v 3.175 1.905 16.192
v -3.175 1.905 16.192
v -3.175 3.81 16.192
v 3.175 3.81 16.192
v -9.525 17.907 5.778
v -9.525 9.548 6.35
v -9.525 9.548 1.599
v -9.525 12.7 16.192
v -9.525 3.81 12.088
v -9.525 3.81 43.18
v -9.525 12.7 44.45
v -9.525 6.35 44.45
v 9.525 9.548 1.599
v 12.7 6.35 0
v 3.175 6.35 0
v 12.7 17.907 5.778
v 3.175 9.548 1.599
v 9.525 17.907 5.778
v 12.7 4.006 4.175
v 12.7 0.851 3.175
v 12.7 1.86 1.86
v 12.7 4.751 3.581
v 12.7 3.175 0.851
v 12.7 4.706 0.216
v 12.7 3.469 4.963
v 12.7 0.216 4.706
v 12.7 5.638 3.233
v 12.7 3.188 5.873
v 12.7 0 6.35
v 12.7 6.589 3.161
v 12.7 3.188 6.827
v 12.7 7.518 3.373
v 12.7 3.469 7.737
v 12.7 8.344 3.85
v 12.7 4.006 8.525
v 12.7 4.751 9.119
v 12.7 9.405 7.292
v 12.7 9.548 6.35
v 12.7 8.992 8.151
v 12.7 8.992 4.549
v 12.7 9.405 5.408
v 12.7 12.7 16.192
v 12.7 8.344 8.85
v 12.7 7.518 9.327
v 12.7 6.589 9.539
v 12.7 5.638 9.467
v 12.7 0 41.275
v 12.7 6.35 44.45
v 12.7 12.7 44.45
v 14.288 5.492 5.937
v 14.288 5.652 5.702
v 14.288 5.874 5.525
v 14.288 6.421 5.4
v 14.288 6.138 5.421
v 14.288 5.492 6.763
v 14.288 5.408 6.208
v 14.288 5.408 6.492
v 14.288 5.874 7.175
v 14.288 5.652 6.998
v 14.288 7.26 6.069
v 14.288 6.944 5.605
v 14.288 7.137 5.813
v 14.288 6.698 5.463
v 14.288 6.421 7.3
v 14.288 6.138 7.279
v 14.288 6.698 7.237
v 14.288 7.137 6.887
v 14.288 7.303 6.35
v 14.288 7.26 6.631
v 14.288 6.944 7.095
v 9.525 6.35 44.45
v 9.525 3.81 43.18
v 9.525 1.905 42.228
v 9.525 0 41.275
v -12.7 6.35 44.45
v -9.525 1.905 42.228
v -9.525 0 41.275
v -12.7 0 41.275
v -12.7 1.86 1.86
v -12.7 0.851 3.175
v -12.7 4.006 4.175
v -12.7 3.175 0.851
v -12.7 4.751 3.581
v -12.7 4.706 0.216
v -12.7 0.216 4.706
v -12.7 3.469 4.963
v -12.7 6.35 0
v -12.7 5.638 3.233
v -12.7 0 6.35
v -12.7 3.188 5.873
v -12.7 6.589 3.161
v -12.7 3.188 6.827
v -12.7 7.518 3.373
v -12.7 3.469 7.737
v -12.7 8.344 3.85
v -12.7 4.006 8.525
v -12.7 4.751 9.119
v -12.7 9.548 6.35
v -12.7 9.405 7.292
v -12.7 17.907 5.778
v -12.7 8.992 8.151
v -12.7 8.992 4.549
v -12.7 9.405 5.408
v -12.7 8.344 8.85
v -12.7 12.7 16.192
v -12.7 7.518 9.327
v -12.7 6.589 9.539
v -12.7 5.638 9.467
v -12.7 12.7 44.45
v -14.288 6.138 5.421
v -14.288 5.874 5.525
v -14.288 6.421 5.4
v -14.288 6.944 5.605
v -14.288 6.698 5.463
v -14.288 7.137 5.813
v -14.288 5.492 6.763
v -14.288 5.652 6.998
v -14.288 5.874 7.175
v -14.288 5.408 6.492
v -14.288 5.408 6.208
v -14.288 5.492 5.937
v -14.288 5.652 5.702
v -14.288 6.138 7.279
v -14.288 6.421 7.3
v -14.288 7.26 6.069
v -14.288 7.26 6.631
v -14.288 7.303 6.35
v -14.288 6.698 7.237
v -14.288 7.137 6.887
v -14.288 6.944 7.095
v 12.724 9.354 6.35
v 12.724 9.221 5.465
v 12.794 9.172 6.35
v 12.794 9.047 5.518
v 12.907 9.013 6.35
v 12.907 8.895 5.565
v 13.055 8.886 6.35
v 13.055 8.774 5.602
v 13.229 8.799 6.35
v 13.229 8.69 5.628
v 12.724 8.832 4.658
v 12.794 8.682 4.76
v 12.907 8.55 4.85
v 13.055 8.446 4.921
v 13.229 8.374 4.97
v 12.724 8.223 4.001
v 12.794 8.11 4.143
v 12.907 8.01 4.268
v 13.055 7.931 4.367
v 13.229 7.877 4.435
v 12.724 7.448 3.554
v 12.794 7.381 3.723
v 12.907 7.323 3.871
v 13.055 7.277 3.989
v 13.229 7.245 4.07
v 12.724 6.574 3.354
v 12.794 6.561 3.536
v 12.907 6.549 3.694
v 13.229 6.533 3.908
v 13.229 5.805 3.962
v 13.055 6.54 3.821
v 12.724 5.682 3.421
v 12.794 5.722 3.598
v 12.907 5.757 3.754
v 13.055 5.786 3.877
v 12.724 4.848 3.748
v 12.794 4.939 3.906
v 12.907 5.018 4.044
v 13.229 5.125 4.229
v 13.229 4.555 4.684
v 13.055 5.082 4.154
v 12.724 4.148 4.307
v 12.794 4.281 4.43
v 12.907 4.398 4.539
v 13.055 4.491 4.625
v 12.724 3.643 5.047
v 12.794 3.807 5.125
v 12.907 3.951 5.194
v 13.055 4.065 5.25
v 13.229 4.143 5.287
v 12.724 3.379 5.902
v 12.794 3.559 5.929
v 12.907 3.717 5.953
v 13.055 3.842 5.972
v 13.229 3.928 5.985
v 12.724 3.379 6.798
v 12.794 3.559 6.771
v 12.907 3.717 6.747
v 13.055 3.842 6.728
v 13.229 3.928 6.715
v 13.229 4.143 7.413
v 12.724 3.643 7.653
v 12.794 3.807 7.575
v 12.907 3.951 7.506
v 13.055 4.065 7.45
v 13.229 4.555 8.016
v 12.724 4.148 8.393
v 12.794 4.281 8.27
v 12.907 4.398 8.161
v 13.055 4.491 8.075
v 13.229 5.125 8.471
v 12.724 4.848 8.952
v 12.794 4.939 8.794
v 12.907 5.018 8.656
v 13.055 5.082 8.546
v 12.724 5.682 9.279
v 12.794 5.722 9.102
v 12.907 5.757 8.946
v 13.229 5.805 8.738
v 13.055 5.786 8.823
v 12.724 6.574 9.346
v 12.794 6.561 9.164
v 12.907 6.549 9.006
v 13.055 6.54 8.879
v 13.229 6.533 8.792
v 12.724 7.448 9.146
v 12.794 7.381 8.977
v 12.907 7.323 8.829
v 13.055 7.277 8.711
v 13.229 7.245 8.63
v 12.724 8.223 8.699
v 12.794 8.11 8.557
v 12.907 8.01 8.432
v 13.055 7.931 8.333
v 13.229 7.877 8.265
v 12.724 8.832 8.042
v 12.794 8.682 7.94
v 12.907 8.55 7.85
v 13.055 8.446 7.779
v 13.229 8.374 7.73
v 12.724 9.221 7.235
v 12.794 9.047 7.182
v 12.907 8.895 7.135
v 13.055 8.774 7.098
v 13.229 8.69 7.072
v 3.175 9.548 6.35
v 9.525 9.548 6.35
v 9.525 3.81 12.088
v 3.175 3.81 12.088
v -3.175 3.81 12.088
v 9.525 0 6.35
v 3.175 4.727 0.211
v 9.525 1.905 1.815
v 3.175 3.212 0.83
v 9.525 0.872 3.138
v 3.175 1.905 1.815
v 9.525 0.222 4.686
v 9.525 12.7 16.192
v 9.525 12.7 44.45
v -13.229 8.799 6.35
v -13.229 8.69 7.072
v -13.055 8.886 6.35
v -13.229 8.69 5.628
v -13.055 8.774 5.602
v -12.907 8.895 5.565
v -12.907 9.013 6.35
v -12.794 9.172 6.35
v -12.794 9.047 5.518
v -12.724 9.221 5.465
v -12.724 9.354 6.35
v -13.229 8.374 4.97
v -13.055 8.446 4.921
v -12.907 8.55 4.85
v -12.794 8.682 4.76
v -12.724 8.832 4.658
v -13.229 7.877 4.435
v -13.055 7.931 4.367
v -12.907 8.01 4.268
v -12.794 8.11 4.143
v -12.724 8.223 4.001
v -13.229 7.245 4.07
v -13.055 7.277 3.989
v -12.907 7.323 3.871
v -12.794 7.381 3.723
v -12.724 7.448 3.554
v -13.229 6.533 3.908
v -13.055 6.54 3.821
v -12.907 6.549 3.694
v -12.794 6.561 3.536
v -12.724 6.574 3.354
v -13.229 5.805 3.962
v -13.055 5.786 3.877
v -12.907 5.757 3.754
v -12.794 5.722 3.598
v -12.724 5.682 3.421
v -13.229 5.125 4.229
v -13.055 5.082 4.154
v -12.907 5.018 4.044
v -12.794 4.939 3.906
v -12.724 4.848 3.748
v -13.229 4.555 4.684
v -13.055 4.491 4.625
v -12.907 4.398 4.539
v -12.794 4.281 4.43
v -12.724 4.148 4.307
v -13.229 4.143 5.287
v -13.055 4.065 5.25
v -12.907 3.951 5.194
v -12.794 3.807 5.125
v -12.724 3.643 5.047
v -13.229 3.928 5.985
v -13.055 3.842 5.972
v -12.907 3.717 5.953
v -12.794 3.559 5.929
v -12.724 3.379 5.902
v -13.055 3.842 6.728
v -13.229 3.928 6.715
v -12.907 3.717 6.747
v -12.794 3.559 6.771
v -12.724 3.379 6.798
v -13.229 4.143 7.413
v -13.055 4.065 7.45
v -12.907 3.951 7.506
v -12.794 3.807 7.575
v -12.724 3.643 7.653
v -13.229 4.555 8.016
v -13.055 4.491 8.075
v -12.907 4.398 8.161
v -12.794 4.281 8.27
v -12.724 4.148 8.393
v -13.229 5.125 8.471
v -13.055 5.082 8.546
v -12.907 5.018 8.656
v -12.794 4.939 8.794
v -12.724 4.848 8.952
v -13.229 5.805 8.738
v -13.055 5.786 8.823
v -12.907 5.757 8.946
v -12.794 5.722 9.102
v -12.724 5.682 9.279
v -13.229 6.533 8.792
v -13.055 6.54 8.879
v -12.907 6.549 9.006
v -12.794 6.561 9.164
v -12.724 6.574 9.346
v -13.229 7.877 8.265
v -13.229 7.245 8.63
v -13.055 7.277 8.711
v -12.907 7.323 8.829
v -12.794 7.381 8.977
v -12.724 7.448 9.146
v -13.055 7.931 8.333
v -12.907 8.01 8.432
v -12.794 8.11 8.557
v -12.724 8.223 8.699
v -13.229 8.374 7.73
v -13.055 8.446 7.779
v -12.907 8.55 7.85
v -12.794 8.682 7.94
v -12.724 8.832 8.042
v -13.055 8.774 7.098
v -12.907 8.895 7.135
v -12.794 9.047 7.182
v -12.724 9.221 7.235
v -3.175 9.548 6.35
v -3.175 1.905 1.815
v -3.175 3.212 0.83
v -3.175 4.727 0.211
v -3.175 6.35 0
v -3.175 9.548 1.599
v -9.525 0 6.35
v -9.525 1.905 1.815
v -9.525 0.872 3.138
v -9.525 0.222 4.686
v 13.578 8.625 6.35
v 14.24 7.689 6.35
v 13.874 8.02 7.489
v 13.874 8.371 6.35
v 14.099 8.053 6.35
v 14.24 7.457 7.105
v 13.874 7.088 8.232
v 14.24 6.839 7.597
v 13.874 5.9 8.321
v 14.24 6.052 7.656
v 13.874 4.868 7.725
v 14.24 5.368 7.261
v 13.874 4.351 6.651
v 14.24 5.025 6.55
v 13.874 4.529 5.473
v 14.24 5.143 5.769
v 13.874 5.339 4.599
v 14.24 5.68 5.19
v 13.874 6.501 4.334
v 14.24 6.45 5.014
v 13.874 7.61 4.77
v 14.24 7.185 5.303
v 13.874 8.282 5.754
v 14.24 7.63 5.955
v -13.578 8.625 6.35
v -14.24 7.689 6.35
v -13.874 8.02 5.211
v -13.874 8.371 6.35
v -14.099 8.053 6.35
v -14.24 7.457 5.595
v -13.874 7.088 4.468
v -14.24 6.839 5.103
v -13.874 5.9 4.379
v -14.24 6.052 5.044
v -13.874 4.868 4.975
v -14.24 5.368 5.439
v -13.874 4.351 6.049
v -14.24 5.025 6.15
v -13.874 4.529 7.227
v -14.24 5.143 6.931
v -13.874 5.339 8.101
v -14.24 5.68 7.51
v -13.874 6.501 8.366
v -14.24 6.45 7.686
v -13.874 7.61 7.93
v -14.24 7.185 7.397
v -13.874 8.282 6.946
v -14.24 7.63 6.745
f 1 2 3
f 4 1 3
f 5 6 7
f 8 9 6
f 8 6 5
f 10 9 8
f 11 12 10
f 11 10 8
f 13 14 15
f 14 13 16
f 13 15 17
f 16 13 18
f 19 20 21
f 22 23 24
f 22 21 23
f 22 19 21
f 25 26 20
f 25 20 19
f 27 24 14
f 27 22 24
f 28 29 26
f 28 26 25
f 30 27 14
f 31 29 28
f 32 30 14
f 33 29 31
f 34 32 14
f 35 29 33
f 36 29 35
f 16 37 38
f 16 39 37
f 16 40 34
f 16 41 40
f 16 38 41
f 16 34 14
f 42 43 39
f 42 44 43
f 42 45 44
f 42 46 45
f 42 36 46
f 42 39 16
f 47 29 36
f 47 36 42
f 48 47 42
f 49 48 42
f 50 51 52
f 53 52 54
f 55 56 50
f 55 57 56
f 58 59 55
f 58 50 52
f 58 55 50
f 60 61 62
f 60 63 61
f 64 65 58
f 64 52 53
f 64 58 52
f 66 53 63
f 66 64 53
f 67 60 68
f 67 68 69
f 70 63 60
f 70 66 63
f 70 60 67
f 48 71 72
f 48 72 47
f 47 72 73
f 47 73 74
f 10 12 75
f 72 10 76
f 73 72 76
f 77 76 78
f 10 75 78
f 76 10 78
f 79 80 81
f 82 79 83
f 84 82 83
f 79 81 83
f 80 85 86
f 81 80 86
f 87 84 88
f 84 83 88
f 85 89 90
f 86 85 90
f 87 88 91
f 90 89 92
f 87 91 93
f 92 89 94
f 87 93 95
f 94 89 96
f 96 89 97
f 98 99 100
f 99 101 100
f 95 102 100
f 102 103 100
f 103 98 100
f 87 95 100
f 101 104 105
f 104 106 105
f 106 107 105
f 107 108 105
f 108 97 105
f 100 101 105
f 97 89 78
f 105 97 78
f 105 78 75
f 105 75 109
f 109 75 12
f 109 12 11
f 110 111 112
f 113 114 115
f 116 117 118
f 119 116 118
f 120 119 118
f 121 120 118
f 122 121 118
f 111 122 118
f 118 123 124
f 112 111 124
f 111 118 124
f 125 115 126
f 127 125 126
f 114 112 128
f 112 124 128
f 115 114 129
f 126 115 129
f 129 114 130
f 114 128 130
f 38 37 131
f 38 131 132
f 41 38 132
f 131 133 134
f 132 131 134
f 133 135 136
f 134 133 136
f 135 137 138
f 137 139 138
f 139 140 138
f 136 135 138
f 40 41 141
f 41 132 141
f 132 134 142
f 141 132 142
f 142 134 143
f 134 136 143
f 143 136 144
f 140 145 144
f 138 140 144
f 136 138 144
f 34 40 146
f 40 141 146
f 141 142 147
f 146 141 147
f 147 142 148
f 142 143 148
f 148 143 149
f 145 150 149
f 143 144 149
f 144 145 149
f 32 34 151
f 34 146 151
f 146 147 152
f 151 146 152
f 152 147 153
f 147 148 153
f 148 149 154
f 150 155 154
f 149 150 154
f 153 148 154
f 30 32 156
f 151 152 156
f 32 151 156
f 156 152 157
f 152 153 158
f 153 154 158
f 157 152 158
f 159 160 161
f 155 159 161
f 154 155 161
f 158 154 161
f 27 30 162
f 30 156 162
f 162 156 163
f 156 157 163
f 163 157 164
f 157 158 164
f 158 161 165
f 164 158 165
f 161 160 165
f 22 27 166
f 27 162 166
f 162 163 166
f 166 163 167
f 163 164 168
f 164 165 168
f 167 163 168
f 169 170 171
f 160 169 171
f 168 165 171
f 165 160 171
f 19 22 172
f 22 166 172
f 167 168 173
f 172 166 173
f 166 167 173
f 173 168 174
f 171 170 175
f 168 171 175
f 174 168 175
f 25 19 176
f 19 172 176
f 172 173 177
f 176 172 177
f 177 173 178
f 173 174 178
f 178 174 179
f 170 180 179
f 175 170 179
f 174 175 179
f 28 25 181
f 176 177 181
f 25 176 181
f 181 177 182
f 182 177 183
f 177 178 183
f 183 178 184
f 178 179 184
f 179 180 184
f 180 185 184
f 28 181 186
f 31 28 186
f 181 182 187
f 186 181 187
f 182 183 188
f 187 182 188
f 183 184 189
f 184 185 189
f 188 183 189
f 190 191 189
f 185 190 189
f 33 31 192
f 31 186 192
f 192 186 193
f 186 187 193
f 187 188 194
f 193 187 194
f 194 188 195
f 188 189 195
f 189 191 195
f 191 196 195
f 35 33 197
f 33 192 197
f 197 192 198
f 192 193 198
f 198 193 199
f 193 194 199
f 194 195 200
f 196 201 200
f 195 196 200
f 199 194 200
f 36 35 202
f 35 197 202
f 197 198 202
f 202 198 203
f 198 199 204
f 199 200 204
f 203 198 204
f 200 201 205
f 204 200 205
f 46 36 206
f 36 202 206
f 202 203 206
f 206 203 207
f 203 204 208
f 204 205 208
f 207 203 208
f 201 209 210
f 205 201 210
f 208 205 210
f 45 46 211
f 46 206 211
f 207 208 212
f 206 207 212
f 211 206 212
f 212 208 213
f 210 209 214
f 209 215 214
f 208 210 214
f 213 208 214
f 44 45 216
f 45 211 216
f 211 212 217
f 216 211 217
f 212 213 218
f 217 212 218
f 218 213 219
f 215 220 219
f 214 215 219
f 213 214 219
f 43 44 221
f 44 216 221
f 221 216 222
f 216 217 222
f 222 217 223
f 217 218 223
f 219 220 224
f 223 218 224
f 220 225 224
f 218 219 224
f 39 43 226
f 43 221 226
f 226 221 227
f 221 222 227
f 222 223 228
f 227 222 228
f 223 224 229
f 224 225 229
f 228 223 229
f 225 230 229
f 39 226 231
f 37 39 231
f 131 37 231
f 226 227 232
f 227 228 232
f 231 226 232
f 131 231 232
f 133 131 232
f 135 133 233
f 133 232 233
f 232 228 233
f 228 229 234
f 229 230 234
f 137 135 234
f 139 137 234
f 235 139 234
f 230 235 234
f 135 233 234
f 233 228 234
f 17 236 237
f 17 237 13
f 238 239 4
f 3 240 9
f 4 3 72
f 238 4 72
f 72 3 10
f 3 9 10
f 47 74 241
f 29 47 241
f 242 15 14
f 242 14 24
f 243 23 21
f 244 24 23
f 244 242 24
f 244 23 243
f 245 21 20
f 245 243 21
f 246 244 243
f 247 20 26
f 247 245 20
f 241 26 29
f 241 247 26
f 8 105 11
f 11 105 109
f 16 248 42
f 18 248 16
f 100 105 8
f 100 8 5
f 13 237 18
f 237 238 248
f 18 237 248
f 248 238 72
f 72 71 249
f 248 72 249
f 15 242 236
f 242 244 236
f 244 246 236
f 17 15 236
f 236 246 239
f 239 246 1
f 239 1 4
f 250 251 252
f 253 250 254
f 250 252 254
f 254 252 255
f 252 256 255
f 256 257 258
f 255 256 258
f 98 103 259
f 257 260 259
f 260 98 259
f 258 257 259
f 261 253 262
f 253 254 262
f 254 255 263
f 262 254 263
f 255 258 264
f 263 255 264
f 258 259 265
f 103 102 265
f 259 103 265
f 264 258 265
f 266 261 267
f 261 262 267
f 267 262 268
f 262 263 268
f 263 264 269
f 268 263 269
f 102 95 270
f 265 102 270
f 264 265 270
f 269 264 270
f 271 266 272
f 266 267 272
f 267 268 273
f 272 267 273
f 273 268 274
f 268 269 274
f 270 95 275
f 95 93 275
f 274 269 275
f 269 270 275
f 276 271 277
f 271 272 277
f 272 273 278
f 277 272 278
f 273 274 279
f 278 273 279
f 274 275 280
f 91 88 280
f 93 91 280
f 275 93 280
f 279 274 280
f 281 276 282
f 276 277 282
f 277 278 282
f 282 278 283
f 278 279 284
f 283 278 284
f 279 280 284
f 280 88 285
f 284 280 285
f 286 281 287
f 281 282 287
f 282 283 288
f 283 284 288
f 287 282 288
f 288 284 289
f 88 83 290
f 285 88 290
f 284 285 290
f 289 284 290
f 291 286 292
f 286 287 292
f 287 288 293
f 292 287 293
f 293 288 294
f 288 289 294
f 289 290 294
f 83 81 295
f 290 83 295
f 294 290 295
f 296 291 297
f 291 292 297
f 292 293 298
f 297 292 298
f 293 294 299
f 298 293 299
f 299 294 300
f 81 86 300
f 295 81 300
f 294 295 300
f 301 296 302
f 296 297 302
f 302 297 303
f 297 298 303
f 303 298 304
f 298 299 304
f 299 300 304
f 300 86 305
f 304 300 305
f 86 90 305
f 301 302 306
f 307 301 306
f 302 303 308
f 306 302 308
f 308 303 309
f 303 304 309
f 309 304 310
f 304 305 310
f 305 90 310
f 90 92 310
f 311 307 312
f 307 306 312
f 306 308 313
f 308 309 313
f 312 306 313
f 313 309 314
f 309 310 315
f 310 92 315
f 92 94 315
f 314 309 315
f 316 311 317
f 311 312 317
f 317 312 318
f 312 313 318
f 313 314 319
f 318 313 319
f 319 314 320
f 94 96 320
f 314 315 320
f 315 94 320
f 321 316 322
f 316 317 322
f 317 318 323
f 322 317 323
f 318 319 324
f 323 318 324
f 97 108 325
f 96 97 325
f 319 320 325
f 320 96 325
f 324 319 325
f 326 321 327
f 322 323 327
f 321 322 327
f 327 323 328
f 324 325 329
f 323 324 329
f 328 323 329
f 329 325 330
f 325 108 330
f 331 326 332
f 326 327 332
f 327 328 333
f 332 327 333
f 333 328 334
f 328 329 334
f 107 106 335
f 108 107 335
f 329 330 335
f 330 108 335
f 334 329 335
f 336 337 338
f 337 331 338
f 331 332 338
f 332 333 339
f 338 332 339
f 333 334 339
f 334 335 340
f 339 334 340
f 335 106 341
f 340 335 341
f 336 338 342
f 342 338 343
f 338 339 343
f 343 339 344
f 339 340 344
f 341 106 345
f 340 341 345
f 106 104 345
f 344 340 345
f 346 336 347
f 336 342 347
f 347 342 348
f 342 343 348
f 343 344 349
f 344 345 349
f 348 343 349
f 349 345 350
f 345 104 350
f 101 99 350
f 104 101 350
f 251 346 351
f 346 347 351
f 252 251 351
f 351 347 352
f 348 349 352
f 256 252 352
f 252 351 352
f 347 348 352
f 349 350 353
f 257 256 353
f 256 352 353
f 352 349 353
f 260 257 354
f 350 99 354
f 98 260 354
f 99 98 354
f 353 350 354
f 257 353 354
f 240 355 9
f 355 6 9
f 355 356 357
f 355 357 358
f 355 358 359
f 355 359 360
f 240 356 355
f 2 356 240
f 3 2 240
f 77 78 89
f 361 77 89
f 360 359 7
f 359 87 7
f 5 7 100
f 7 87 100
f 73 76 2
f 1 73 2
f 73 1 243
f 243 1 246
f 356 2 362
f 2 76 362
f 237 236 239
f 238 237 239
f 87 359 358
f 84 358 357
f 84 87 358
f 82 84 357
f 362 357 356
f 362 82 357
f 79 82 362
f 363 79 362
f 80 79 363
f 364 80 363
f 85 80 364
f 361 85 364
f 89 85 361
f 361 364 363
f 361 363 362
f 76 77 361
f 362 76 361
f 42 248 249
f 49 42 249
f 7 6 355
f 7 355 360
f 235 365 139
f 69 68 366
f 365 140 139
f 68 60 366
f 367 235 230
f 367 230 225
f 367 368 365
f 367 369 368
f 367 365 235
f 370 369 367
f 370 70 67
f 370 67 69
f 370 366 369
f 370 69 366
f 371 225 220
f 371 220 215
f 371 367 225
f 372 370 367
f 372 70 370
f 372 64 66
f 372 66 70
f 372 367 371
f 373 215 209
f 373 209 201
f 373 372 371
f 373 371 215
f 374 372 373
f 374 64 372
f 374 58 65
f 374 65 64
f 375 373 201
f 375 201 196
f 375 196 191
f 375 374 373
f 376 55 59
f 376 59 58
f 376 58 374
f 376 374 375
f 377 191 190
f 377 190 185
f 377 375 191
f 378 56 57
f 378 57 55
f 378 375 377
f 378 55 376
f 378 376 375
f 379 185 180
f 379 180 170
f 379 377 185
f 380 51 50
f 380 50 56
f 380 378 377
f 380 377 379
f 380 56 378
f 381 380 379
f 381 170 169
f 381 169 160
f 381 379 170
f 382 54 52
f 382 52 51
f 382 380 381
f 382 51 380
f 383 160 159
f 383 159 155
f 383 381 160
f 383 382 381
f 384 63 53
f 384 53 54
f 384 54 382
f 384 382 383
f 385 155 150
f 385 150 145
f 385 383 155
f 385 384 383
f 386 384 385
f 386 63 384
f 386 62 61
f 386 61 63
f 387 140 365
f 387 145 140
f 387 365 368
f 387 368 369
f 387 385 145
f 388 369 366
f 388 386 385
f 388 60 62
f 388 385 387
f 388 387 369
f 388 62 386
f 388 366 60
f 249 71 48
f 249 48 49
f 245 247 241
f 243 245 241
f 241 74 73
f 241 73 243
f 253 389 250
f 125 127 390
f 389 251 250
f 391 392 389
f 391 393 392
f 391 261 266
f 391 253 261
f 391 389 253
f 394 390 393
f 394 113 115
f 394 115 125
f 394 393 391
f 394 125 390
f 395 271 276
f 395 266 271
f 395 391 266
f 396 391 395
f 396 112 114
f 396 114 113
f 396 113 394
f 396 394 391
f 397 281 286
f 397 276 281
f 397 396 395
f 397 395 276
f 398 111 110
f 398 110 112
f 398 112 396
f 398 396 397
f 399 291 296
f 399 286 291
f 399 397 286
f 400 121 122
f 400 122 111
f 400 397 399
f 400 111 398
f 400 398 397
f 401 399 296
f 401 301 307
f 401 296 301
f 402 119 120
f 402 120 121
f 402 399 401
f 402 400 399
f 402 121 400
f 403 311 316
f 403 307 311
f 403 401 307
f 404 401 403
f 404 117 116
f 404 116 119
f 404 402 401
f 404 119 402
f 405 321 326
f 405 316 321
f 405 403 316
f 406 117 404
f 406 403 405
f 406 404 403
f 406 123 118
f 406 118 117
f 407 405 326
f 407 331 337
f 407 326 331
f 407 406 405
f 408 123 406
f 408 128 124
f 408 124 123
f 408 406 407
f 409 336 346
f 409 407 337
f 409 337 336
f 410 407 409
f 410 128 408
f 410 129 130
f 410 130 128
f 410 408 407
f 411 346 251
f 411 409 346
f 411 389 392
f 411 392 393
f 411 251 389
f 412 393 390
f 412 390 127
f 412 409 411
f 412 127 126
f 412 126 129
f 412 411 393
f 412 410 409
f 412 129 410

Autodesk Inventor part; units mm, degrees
ref_plane "YZ Plane" through (0, 0, 0) normal (1, 0, 0) x (0, 1, 0)
ref_plane "XZ Plane" through (0, 0, 0) normal (0, 1, 0) x (-1, 0, 0)
ref_plane "XY Plane" through (0, 0, 0) normal (0, 0, 1) x (1, 0, 0)
sketch "Sketch2" plane through (0, 0, 0) normal (1, 0, 0) x (0, 1, 0)
  line L0 (0, 0) -> (12.7, 0) construction
  line L1 (12.7, 0) -> (12.7, 44.45) construction
  line L2 (12.7, 44.45) -> (0, 44.45) construction
  line L3 (0, 44.45) -> (0, 0) construction
  arc A0 (0, 6.35) -> (6.35, 0) centre (6.35, 6.35) ccw
  line L4 (6.35, 0) -> (6.35, 44.45) construction
  line L5 (6.35, 44.45) -> (0, 41.275)
  line L6 (0, 41.275) -> (0, 6.35)
  line L7 (6.35, 44.45) -> (6.35, 42.545)
  line L8 (6.35, 42.545) -> (1.905, 40.3225)
  line L9 (1.905, 40.3225) -> (1.905, 9.525)
  line L10 (6.35, 44.45) -> (12.7, 44.45)
  line L11 (6.35, 0) -> (12.7, 3.175)
  line L12 (12.7, 3.175) -> (12.7, 44.45)
  line L13 (6.35, 6.35) -> (6.35, 0)
  line L14 (6.35, 6.35) -> (1.905, 9.525)
  circle A1 centre (6.35, 6.35) radius 2.54
  line L15 (0, 16.1925) -> (12.7, 16.1925)
  line L16 (3.81, 0.5301) -> (3.81, 43.18)
  line L17 (1.905, 9.525) -> (1.905, 1.8152)
  line L18 (1.905, 40.3225) -> (1.905, 42.2275)
  line L19 (12.7, 16.1925) -> (17.907, 5.7785)
  line L20 (12.7, 3.175) -> (17.907, 5.7785)
  dimension "d2" = 12.7
  dimension "d3" = 44.45
  dimension "d4" = 12.7
  dimension "d5" = 3.175
  dimension "d6" = 1.905
  dimension "d7" = 1.905
  dimension "d8" = 3.175
  dimension "d9" = 3.175
  dimension "d10" = 5.08
  dimension "d11" = 16.1925
  dimension "d22" = 1.905
extrude "Extrusion1" add sketch "Sketch2" along normal mid plane 28.575 contours A1 L14 L13 | L13 L14 A1
extrude "Extrusion2" add sketch "Sketch2" along normal mid plane 25.4
extrude "Extrusion4" cut sketch "Sketch2" along normal mid plane 6.35 contours L6 L15 L9 L17 A0 | L17 L14 L16 A0 | L16 A1 L13 A0 | L9 L15 L16 L14 | L13 A1 L14 L16 L15 L12 L11 | L16 L14 A1 | A1 L14 L13 | L13 L14 A1
fillet "Fillet1" radius 1.5875 2 edges at (-14.2875, 3.81, 6.35) (14.2875, 3.81, 6.35)
fillet "Fillet2" radius 0.7937 4 edges at (-12.7, 3.81, 6.35) (-12.7001, 3.81, 6.35) (12.7001, 3.81, 6.35) (12.7, 3.81, 6.35)
sketch "Sketch3" plane through (0, 0, 0) normal (1, 0, 0) x (0, 1, 0)
  line L0 (12.7, 44.45) -> (12.7, 16.1925) projected
  line L1 (17.907, 5.7785) -> (6.35, 0) projected
  arc A0 (0, 6.35) -> (6.35, 0) centre (6.35, 6.35) ccw projected
  line L2 (0, 6.35) -> (0, 41.275) projected
  line L3 (0, 41.275) -> (6.35, 44.45) projected
  line L4 (6.35, 44.45) -> (12.7, 44.45) projected
  circle A1 centre (6.35, 6.35) radius 3.1976 projected
  circle A2 centre (6.35, 6.35) radius 3.1976 projected
  line L5 (3.81, 0.5301) -> (3.81, 43.18) projected
  line L6 (1.905, 40.3225) -> (1.905, 9.525) projected
  line L7 (1.905, 42.2275) -> (1.905, 1.8152)
  line L8 (0, 0) -> (1.905, 0)
  line L9 (1.905, 0) -> (1.905, 42.2275)
  line L10 (1.905, 42.2275) -> (0, 42.2275)
  line L11 (0, 42.2275) -> (0, 0)
  circle A3 centre (6.35, 6.35) radius 3.1976
  line L12 (9.5476, 44.45) -> (9.5476, 1.5988)
  line L13 (12.7, 44.45) -> (9.5476, 44.45)
  line L14 (9.5476, 44.45) -> (9.5476, 0)
  line L15 (9.5476, 0) -> (12.7, 0)
  line L16 (12.7, 0) -> (12.7, 44.45)
  line L17 (6.3337, 9.5475) -> (1.905, 9.525)
  circle A4 centre (6.35, 6.35) radius 3.1976
  line L18 (9.5476, 6.35) -> (9.5476, 0)
  line L19 (9.5476, 0) -> (1.905, 0)
  line L20 (9.5476, 7.1442) -> (9.5476, 44.45)
  line L21 (6.35, 44.45) -> (3.81, 43.18)
  line L22 (3.81, 12.0876) -> (3.81, 43.18)
  line L23 (1.905, 42.2275) -> (6.35, 44.45)
  line L24 (6.35, 44.45) -> (9.5476, 44.45)
  line L25 (9.5476, 44.45) -> (9.5476, 6.35)
  line L26 (9.5476, 6.35) -> (1.905, 13.9926)
  line L27 (12.7, 16.1925) -> (17.907, 5.7785) projected
  dimension "d25" = 1.905
extrude "Extrusion6" cut sketch "Sketch3" along normal mid plane 19.05 contours L0 L16 L1 L12 L4 | L27 L1 L16 | L12 A1 L26 L5 L3 L4 | L26 A1 | L7 L6 A0 L2 L3
equation "\"d7\" = d6"
equation "\"d22\" = d7"
properties part number "LegV2"
